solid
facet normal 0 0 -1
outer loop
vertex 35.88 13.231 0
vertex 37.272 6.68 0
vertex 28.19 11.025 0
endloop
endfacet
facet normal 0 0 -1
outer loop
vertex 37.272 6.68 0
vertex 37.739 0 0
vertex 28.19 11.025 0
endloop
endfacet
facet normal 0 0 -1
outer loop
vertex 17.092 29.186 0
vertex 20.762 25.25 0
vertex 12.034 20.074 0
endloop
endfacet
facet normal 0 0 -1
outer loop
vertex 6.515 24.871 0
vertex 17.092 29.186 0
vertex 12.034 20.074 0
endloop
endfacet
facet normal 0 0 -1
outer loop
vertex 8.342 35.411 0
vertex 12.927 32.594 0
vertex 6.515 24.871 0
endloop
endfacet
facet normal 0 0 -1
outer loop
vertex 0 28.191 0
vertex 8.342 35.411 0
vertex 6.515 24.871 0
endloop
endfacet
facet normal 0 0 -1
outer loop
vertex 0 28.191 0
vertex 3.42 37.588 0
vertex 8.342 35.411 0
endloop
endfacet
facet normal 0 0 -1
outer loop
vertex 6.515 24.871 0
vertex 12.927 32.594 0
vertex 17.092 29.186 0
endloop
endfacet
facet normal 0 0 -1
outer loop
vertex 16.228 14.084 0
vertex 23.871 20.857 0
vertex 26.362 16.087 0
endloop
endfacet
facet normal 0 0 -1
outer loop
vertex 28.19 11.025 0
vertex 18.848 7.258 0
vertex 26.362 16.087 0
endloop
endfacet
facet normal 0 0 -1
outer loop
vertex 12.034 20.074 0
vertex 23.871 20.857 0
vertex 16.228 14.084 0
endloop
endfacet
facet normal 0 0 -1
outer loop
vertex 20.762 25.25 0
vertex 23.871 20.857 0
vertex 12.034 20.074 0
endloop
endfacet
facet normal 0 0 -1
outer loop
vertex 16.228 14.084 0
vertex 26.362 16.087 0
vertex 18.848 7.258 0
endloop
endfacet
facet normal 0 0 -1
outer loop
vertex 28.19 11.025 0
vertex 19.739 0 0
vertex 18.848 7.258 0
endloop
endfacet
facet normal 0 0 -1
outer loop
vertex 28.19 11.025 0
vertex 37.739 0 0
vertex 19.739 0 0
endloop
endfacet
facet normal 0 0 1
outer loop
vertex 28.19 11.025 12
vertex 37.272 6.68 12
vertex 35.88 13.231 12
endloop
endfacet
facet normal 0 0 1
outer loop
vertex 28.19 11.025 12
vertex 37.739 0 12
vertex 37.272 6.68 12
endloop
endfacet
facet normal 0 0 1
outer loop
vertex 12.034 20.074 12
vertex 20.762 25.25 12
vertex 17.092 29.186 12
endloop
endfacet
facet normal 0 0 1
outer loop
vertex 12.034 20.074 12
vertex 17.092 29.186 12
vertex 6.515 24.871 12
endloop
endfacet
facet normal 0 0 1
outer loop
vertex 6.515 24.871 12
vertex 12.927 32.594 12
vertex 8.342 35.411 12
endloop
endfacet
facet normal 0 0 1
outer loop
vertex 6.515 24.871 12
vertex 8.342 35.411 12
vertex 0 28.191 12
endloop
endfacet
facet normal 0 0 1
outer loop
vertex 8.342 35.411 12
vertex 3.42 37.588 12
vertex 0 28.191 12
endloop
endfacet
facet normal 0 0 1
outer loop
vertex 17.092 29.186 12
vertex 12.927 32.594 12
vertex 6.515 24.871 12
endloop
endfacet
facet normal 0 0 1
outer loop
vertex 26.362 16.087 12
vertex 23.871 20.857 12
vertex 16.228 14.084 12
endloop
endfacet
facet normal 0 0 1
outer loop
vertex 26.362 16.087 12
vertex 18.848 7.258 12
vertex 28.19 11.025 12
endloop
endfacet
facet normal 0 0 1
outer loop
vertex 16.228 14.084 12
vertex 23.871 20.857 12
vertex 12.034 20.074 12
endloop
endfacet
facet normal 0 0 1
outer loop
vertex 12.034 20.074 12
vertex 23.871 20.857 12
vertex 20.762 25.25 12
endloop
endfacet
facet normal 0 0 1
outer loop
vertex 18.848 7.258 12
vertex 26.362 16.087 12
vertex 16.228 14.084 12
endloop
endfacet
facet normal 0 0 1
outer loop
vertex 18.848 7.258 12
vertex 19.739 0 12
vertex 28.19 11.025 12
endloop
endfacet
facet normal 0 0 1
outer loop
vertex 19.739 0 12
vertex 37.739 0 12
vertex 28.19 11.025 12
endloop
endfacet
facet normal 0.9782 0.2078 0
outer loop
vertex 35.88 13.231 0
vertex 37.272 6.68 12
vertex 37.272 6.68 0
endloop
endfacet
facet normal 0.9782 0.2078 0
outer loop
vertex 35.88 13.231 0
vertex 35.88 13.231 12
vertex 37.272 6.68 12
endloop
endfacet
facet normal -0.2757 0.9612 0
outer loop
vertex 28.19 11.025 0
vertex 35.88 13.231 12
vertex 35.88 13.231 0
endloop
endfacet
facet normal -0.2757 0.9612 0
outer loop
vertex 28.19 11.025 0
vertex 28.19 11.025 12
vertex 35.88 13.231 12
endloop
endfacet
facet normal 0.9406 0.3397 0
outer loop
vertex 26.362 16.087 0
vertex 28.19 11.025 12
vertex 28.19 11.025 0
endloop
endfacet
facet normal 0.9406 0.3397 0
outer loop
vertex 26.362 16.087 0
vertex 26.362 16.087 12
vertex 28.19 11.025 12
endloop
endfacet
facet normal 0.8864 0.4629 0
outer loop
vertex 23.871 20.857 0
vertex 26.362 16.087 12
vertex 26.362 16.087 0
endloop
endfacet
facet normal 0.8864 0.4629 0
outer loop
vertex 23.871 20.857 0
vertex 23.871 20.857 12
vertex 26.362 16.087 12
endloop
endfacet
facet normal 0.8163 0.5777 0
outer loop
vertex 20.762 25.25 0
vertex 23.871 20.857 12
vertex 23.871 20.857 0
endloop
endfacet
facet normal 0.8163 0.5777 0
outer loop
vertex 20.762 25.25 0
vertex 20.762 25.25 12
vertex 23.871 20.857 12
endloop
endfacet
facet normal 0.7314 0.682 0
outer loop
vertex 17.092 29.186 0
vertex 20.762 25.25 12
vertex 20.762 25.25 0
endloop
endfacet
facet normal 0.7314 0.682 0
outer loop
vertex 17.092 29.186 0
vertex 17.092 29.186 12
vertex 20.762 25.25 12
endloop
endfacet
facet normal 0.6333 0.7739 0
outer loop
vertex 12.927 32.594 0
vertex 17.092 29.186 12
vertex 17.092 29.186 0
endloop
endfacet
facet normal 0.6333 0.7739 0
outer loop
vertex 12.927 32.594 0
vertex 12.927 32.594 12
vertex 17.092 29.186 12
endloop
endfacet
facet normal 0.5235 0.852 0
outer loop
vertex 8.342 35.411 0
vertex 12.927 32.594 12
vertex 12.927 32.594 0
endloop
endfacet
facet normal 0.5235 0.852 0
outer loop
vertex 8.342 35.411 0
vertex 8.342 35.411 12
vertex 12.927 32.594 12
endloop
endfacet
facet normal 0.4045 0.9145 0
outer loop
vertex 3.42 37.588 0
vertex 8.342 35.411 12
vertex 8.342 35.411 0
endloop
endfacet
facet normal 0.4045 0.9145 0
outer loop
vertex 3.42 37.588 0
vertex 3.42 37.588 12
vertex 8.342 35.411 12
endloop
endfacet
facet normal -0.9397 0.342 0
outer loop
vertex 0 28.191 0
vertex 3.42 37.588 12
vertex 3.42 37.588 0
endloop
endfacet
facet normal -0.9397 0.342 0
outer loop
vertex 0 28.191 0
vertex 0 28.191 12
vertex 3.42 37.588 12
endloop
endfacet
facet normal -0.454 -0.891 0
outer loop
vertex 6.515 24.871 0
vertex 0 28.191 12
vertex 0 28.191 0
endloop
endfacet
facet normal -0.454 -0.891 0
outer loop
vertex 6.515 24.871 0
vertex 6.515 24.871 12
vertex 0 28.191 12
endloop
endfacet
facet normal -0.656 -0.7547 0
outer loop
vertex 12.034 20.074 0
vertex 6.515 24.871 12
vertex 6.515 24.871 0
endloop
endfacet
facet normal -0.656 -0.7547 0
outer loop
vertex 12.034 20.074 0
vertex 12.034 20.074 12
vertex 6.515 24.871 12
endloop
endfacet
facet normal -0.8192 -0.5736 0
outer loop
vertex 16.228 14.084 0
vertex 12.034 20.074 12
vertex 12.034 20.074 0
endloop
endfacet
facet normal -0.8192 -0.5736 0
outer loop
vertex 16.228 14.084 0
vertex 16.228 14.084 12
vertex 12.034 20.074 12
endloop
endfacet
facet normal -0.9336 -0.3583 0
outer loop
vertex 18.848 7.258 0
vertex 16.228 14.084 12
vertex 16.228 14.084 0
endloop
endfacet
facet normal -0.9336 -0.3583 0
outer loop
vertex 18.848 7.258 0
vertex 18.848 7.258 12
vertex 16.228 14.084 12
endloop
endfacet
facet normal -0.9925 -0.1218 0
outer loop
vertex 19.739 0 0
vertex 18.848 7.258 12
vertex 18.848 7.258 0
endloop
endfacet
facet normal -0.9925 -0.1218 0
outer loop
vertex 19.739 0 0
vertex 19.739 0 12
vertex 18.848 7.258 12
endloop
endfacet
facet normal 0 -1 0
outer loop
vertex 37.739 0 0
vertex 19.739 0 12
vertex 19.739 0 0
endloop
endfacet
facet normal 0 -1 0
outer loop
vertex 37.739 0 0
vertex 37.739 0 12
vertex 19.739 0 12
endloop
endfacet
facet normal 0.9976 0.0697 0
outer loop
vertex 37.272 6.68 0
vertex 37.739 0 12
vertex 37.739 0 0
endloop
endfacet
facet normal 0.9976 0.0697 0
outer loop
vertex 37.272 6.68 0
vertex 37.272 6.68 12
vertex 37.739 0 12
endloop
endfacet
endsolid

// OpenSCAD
$fn = 32;

// ----------------------------------------------------------------------
// Arc stop: segment, 12 mm thick
// ----------------------------------------------------------------------

// --- parameters (mm) ---
profile_height = 12;      // extrusion height
profile_points = 17;      // points of the closed outline

profile = [[37.739, 0], [37.272, 6.68], [35.88, 13.231], [28.19, 11.025], [26.362, 16.087], [23.871, 20.857], [20.762, 25.25], [17.092, 29.186], [12.927, 32.594], [8.342, 35.411], [3.42, 37.588], [0, 28.191], [6.515, 24.871], [12.034, 20.074], [16.228, 14.084], [18.848, 7.258], [19.739, 0]];  // single closed polygon, 17 points, counter clockwise

// --- the one profile operation ---
linear_extrude(height = profile_height) polygon(points = profile);
